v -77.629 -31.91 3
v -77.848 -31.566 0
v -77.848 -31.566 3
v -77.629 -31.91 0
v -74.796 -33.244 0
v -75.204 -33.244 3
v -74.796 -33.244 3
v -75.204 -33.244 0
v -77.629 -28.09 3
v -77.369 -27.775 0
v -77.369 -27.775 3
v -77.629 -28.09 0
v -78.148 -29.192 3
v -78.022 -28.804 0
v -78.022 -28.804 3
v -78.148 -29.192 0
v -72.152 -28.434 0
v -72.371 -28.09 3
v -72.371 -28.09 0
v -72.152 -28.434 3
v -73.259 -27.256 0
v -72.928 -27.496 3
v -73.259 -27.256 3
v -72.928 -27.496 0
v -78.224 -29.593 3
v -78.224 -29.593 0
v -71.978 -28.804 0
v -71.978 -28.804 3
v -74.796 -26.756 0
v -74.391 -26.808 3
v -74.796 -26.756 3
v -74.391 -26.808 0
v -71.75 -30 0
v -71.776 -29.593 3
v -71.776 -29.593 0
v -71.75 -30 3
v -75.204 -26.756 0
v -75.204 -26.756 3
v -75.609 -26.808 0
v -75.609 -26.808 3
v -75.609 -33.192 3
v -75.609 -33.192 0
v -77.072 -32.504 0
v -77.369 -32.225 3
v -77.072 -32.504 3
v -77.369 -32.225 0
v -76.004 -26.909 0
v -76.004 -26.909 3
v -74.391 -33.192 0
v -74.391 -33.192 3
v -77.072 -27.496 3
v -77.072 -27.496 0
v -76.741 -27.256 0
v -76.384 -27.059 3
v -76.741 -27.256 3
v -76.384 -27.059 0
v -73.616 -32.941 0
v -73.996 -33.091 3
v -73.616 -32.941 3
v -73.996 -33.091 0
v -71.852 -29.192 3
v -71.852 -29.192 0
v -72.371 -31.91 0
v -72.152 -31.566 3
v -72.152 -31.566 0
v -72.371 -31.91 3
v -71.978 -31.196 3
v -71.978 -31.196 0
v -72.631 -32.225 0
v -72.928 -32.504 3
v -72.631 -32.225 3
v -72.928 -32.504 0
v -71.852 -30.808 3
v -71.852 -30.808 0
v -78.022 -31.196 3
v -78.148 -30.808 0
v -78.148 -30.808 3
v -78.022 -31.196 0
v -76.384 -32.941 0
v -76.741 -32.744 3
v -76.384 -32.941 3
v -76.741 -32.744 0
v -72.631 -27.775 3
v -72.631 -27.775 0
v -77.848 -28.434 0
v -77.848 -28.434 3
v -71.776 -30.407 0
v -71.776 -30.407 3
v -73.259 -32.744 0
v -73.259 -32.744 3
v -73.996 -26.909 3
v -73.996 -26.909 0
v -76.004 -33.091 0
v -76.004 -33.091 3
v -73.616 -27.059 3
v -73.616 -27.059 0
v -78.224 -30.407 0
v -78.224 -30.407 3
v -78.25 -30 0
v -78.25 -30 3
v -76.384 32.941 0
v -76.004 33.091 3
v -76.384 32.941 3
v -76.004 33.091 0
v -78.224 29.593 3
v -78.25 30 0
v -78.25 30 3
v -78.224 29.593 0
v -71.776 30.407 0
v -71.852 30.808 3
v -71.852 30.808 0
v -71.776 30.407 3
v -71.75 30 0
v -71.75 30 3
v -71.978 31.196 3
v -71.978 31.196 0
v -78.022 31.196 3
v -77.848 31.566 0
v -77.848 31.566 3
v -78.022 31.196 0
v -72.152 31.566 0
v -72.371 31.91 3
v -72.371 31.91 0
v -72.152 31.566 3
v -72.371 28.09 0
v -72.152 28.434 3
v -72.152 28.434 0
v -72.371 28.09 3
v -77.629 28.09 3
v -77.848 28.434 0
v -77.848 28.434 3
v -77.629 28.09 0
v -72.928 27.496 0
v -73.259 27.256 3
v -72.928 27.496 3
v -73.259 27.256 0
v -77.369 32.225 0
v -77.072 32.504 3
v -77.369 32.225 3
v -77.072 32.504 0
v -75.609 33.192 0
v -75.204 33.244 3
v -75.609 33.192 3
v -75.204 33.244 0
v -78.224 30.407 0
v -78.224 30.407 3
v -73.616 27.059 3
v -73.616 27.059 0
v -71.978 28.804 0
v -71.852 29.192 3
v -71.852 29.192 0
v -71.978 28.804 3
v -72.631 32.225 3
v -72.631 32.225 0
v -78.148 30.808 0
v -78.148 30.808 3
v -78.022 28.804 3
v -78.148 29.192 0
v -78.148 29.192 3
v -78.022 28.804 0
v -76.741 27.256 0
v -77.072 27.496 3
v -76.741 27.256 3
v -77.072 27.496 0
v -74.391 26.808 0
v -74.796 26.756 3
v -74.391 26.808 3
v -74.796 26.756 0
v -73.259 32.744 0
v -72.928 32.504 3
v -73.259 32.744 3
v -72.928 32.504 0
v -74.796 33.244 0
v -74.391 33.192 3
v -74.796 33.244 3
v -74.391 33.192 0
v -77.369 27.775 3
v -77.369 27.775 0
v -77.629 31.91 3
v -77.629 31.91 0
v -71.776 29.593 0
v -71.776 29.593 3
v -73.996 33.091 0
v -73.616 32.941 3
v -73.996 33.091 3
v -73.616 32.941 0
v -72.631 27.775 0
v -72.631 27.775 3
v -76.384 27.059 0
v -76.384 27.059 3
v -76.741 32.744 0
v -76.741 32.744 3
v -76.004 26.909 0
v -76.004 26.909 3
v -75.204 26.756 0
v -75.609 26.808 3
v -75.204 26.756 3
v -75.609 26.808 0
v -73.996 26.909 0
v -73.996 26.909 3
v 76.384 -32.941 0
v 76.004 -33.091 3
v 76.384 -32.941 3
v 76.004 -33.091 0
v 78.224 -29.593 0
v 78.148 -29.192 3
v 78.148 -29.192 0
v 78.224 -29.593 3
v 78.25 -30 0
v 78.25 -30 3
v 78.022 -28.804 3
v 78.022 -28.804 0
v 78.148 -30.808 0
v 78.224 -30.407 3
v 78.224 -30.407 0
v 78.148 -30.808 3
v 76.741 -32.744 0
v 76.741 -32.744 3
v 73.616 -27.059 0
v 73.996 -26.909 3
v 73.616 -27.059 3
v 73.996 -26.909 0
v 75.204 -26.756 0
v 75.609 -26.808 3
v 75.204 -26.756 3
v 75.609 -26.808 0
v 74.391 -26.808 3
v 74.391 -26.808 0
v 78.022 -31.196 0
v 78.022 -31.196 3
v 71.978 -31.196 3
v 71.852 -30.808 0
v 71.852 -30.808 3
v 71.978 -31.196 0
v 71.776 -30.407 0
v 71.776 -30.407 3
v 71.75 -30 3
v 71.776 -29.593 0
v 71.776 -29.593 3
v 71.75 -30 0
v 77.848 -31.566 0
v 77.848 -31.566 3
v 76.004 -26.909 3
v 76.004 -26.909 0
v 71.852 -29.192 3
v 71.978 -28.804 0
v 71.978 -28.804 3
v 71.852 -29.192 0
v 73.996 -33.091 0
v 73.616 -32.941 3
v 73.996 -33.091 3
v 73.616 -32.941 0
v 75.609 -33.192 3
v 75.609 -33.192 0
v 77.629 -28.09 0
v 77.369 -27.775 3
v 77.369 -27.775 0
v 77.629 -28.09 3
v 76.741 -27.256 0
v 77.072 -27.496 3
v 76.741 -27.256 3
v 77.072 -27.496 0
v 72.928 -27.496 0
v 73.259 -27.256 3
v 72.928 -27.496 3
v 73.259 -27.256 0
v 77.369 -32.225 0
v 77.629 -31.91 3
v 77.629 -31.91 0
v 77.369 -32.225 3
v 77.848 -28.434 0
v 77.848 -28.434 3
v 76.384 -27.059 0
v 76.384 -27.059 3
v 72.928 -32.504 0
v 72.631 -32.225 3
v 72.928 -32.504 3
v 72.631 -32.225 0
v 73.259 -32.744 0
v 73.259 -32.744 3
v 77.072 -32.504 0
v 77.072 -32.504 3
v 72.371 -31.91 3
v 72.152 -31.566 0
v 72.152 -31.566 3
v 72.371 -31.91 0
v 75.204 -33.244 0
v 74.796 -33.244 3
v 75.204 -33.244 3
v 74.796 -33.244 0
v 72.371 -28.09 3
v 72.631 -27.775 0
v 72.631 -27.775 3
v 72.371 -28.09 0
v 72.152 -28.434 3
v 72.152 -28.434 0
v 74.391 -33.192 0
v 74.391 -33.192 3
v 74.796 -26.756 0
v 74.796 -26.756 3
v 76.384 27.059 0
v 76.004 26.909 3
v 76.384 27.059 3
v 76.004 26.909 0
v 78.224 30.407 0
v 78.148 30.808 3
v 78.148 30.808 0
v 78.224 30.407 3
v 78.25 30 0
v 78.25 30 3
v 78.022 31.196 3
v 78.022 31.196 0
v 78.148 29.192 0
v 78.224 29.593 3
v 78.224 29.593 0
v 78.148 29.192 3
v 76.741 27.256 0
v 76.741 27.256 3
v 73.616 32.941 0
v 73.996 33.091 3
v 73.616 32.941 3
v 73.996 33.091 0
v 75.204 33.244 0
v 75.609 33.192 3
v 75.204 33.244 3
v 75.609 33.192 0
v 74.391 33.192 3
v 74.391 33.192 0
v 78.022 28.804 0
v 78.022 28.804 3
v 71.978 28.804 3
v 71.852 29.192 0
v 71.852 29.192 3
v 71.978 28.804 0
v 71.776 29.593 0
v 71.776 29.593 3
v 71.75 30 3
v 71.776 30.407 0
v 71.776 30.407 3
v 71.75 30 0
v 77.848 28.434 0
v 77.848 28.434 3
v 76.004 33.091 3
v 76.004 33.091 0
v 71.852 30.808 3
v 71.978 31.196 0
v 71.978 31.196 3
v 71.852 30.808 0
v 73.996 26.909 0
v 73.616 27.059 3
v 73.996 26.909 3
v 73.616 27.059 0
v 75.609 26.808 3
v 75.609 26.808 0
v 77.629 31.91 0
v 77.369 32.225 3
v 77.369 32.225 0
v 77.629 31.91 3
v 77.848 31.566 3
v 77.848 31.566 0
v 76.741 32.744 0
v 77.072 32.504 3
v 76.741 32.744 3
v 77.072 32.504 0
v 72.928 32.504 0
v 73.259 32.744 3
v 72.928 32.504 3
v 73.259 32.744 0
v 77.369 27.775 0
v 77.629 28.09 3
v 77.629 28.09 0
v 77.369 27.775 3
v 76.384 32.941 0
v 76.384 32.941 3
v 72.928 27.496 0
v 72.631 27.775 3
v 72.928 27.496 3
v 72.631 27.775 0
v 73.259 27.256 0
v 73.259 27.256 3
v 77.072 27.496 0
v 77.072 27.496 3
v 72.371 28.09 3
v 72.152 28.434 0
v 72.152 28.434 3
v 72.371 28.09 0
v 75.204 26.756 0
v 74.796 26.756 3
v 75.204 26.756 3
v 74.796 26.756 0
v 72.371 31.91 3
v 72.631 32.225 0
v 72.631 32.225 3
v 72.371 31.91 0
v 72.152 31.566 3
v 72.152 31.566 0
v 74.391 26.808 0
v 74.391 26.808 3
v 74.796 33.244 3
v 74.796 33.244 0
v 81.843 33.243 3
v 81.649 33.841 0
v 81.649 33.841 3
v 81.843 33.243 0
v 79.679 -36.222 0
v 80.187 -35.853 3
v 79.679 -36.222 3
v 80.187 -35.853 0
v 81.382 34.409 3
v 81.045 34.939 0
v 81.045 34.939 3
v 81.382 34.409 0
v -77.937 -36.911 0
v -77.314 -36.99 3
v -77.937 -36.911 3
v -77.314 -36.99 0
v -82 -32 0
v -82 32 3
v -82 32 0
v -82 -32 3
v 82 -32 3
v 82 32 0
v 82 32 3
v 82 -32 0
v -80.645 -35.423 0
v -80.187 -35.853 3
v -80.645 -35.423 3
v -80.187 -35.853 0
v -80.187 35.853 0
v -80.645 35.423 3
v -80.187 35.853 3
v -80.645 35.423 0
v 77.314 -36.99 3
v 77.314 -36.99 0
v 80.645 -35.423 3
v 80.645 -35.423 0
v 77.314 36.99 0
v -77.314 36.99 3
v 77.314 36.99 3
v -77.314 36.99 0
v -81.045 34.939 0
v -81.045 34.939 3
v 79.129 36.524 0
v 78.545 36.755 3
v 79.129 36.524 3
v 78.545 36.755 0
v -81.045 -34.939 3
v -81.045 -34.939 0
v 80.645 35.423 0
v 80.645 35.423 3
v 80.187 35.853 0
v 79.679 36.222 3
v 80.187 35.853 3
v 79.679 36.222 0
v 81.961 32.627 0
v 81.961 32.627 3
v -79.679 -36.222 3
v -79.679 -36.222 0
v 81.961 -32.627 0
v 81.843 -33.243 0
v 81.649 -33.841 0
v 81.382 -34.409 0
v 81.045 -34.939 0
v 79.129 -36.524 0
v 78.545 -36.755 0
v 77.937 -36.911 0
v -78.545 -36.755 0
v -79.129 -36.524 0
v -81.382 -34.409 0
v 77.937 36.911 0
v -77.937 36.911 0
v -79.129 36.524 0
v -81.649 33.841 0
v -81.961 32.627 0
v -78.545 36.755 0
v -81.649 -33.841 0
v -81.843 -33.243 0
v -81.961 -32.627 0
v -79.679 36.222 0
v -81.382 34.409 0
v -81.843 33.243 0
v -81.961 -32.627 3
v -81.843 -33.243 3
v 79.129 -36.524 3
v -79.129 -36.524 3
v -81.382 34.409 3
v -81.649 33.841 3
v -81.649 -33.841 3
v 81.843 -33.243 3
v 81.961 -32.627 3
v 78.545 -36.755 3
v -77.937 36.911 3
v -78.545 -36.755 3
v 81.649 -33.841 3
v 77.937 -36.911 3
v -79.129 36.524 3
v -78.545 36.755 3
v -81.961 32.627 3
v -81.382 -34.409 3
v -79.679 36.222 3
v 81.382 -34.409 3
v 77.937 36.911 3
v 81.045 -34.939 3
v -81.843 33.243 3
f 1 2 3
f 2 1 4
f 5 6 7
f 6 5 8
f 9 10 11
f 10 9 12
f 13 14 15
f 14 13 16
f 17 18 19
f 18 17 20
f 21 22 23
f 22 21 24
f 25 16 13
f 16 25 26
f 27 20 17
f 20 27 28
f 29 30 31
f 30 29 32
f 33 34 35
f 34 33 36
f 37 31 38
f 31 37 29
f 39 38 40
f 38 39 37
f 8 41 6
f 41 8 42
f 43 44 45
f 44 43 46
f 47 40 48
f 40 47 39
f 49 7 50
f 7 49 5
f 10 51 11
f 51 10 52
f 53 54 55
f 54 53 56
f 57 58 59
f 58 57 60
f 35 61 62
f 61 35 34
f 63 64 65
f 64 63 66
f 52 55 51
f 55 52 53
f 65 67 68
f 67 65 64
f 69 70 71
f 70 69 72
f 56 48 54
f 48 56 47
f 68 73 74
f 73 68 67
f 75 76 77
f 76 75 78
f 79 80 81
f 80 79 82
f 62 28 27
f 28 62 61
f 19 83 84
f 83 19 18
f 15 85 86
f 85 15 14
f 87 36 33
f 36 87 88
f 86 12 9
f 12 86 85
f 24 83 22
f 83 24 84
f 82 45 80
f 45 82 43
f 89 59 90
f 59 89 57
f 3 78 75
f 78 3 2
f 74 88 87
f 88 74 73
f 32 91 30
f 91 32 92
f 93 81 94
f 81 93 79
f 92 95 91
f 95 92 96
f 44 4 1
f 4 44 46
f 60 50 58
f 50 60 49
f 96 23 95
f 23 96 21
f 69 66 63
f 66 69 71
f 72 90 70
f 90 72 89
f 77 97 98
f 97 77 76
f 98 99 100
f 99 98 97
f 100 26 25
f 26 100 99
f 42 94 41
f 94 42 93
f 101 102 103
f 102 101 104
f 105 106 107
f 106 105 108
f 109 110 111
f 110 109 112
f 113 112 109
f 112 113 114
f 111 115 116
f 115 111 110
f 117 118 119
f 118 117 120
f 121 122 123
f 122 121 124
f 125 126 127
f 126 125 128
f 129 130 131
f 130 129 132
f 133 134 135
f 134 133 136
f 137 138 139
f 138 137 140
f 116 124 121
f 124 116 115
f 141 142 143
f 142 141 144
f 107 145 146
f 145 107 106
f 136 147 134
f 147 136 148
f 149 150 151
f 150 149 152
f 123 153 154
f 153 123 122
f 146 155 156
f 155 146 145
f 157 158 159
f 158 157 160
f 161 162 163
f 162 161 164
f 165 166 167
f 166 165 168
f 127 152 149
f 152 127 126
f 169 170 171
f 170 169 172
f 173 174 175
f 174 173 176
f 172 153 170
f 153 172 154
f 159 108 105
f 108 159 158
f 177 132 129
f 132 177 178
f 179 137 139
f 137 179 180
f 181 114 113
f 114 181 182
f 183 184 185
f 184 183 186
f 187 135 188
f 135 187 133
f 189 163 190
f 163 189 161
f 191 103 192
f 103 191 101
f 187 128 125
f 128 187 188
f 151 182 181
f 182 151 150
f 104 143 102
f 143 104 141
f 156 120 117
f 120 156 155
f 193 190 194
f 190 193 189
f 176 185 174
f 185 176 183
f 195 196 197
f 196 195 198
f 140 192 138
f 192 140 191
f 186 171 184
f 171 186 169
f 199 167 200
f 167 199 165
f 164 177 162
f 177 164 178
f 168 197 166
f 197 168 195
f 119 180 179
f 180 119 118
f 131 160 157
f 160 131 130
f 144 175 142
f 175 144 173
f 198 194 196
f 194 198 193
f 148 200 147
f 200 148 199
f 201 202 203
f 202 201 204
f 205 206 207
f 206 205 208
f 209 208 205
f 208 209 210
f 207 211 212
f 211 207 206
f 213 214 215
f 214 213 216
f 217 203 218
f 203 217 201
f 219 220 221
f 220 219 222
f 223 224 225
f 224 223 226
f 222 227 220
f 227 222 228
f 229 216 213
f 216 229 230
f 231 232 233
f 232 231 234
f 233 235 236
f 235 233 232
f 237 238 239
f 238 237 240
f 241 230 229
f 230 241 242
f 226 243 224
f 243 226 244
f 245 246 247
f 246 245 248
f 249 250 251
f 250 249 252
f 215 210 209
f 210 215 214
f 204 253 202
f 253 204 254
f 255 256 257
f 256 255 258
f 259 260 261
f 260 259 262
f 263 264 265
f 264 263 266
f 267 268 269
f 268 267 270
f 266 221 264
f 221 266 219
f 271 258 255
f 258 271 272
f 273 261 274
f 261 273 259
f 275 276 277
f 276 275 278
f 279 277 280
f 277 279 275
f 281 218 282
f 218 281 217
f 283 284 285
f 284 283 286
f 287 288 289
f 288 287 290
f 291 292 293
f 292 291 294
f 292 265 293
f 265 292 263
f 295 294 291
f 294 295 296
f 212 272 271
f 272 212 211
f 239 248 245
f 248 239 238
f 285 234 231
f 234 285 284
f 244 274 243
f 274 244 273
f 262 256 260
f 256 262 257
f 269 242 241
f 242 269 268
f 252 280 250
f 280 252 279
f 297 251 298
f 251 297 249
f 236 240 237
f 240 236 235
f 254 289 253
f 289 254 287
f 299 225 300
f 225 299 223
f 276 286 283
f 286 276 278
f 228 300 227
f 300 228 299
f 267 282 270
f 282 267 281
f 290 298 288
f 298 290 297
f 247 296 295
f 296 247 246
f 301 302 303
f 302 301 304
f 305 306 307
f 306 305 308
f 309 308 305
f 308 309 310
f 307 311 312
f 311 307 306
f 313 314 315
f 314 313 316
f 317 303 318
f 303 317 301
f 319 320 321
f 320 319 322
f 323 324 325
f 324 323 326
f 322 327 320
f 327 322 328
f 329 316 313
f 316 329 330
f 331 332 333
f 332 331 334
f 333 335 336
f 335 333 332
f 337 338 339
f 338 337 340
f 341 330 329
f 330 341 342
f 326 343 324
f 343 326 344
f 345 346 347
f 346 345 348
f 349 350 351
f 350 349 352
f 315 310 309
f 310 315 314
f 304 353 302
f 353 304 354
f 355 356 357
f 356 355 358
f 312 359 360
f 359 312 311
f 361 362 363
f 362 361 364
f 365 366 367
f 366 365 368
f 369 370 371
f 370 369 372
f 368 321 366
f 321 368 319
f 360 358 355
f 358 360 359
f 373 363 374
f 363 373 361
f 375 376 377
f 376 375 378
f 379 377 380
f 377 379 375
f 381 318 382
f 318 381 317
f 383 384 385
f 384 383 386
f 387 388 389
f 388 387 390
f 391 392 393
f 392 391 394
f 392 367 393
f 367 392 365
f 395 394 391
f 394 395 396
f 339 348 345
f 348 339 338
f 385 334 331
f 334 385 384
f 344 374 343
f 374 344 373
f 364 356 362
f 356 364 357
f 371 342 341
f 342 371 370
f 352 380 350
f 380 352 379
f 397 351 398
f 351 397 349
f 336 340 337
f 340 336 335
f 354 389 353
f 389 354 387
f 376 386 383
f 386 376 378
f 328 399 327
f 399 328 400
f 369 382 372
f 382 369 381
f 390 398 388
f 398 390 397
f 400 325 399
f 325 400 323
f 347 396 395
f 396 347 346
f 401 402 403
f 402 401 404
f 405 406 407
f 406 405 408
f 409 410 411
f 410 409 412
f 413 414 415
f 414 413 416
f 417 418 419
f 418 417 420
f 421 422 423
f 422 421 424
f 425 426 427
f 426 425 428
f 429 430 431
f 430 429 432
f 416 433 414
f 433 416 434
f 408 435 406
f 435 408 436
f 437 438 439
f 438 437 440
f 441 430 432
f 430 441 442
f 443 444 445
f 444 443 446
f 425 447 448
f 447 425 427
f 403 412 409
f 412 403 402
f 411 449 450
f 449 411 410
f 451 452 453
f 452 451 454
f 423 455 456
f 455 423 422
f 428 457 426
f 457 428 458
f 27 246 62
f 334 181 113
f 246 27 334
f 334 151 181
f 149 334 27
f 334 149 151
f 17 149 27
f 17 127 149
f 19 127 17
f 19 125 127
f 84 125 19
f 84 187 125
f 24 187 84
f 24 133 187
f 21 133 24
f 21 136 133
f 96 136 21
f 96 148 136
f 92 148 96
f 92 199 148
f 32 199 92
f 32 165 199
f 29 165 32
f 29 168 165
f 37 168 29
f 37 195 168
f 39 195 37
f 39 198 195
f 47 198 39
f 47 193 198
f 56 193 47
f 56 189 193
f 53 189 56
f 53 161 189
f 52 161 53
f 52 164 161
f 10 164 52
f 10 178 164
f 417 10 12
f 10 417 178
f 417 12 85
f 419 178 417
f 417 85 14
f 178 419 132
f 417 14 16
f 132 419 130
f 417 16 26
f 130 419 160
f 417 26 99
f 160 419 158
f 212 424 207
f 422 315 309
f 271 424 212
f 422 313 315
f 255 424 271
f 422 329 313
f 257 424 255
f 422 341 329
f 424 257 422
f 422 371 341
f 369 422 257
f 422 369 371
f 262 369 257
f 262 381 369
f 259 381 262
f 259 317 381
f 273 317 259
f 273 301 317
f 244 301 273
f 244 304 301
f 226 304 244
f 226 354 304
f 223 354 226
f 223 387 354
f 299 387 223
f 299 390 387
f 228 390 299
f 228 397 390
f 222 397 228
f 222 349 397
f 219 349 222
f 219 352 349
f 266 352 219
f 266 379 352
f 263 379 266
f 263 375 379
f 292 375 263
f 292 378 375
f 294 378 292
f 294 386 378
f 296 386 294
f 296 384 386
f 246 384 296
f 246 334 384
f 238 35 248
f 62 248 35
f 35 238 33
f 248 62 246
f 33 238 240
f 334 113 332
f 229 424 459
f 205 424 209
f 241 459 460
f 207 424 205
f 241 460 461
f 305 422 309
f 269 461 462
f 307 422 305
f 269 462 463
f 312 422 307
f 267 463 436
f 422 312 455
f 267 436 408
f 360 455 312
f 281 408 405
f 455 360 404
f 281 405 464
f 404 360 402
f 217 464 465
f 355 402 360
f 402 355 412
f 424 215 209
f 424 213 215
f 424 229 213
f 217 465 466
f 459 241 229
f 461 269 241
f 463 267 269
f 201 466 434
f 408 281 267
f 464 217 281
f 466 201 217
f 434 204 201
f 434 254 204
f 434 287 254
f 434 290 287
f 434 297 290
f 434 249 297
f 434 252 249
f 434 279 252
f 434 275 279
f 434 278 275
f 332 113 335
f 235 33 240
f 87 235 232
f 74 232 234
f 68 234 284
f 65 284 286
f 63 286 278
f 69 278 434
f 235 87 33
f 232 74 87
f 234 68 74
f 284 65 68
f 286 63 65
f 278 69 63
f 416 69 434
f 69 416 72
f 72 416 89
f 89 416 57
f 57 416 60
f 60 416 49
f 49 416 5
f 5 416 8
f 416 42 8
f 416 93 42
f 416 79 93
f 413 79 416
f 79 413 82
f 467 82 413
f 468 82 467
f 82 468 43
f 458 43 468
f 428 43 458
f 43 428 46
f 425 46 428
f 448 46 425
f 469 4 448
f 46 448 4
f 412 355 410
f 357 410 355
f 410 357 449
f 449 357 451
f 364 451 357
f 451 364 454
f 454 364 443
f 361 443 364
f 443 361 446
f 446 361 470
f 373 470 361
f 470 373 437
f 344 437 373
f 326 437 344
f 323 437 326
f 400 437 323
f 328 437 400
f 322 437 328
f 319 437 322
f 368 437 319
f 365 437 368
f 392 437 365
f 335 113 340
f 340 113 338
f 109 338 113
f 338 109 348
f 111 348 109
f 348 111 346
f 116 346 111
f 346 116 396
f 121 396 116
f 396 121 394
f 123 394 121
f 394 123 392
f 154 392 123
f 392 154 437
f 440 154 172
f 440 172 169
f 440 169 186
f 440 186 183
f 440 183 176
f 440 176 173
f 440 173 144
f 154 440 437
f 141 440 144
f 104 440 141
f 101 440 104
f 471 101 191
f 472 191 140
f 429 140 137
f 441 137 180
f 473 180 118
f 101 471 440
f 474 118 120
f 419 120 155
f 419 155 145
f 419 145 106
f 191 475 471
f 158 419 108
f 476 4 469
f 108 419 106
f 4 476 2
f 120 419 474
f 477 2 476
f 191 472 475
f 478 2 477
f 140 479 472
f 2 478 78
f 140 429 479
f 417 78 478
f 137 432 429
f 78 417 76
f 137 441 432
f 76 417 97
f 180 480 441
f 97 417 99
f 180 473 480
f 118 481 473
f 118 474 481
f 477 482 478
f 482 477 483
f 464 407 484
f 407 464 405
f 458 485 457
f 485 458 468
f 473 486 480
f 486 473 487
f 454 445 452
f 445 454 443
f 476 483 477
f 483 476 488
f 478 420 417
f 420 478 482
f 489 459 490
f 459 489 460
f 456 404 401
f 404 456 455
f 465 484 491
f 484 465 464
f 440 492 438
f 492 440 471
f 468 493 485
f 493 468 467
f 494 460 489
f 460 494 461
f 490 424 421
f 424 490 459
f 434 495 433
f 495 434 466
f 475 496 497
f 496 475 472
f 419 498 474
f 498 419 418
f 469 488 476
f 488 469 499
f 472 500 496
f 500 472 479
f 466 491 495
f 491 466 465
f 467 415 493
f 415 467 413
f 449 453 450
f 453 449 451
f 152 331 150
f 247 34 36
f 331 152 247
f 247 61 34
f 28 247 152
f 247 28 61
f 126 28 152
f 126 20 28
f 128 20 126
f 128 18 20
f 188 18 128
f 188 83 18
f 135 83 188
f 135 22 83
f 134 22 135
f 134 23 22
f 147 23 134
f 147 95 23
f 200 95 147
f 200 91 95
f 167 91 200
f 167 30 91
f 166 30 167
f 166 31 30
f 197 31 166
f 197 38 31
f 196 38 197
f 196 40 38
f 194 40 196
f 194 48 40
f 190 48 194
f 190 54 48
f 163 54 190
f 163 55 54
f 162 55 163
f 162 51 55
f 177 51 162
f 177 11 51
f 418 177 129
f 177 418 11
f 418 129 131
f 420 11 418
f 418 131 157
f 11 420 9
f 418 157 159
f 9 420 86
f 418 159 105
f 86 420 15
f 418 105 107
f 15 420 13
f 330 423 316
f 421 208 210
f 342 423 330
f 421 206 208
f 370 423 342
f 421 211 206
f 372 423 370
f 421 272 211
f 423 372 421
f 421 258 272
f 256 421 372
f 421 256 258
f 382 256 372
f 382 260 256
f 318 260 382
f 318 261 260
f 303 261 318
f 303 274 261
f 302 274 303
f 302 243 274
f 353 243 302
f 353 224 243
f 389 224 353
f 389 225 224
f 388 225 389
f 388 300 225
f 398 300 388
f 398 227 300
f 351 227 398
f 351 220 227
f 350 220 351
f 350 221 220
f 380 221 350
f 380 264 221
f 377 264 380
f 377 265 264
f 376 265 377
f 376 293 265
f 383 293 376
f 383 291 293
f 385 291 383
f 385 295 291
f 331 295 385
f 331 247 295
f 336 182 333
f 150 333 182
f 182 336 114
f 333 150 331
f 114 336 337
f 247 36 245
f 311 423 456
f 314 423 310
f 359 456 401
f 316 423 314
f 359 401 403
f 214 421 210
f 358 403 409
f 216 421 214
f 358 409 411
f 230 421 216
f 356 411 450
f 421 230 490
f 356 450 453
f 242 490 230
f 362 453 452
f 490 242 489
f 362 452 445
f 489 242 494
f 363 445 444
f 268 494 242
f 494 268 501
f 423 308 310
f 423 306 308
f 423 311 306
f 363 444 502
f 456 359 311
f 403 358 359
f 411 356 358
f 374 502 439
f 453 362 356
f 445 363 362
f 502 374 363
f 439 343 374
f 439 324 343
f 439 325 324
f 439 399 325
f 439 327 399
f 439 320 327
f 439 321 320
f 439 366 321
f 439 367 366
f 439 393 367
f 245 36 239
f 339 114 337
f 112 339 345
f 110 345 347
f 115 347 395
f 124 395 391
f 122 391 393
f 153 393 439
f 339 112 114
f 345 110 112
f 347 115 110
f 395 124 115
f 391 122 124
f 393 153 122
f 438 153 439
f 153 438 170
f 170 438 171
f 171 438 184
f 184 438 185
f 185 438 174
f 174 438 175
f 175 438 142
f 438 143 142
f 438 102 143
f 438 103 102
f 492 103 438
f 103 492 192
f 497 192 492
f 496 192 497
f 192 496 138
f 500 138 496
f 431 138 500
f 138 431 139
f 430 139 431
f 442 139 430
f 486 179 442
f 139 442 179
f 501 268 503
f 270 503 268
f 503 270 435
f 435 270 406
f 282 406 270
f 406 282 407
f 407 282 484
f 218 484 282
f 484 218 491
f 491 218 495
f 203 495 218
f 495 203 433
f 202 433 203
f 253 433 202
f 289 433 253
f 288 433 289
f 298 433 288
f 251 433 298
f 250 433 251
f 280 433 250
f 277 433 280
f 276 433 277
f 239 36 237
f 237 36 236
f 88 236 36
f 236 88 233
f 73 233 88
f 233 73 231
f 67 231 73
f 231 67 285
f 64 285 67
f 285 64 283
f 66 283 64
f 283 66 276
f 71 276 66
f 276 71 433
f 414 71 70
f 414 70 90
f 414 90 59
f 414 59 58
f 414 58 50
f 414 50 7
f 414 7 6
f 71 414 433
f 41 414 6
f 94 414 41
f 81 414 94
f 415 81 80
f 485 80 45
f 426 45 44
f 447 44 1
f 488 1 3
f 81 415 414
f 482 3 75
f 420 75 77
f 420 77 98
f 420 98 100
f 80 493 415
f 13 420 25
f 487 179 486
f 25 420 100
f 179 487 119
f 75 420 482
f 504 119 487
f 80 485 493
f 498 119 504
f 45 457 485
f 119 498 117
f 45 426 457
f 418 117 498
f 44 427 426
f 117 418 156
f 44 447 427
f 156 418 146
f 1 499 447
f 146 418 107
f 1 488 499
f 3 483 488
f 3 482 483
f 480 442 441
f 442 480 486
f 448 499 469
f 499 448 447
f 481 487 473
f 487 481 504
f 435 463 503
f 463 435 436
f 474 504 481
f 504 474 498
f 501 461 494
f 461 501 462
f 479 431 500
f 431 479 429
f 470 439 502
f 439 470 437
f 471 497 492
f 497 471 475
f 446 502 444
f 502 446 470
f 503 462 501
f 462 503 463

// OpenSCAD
$fn = 50;


difference() {
	union() {
		hull() {
			translate(v = [-77.0000000000, 32.0000000000, 0]) {
				cylinder(h = 3, r = 5);
			}
			translate(v = [77.0000000000, 32.0000000000, 0]) {
				cylinder(h = 3, r = 5);
			}
			translate(v = [-77.0000000000, -32.0000000000, 0]) {
				cylinder(h = 3, r = 5);
			}
			translate(v = [77.0000000000, -32.0000000000, 0]) {
				cylinder(h = 3, r = 5);
			}
		}
	}
	union() {
		translate(v = [-75.0000000000, -30.0000000000, -100.0000000000]) {
			cylinder(h = 200, r = 3.2500000000);
		}
		translate(v = [-75.0000000000, 30.0000000000, -100.0000000000]) {
			cylinder(h = 200, r = 3.2500000000);
		}
		translate(v = [75.0000000000, -30.0000000000, -100.0000000000]) {
			cylinder(h = 200, r = 3.2500000000);
		}
		translate(v = [75.0000000000, 30.0000000000, -100.0000000000]) {
			cylinder(h = 200, r = 3.2500000000);
		}
	}
}
